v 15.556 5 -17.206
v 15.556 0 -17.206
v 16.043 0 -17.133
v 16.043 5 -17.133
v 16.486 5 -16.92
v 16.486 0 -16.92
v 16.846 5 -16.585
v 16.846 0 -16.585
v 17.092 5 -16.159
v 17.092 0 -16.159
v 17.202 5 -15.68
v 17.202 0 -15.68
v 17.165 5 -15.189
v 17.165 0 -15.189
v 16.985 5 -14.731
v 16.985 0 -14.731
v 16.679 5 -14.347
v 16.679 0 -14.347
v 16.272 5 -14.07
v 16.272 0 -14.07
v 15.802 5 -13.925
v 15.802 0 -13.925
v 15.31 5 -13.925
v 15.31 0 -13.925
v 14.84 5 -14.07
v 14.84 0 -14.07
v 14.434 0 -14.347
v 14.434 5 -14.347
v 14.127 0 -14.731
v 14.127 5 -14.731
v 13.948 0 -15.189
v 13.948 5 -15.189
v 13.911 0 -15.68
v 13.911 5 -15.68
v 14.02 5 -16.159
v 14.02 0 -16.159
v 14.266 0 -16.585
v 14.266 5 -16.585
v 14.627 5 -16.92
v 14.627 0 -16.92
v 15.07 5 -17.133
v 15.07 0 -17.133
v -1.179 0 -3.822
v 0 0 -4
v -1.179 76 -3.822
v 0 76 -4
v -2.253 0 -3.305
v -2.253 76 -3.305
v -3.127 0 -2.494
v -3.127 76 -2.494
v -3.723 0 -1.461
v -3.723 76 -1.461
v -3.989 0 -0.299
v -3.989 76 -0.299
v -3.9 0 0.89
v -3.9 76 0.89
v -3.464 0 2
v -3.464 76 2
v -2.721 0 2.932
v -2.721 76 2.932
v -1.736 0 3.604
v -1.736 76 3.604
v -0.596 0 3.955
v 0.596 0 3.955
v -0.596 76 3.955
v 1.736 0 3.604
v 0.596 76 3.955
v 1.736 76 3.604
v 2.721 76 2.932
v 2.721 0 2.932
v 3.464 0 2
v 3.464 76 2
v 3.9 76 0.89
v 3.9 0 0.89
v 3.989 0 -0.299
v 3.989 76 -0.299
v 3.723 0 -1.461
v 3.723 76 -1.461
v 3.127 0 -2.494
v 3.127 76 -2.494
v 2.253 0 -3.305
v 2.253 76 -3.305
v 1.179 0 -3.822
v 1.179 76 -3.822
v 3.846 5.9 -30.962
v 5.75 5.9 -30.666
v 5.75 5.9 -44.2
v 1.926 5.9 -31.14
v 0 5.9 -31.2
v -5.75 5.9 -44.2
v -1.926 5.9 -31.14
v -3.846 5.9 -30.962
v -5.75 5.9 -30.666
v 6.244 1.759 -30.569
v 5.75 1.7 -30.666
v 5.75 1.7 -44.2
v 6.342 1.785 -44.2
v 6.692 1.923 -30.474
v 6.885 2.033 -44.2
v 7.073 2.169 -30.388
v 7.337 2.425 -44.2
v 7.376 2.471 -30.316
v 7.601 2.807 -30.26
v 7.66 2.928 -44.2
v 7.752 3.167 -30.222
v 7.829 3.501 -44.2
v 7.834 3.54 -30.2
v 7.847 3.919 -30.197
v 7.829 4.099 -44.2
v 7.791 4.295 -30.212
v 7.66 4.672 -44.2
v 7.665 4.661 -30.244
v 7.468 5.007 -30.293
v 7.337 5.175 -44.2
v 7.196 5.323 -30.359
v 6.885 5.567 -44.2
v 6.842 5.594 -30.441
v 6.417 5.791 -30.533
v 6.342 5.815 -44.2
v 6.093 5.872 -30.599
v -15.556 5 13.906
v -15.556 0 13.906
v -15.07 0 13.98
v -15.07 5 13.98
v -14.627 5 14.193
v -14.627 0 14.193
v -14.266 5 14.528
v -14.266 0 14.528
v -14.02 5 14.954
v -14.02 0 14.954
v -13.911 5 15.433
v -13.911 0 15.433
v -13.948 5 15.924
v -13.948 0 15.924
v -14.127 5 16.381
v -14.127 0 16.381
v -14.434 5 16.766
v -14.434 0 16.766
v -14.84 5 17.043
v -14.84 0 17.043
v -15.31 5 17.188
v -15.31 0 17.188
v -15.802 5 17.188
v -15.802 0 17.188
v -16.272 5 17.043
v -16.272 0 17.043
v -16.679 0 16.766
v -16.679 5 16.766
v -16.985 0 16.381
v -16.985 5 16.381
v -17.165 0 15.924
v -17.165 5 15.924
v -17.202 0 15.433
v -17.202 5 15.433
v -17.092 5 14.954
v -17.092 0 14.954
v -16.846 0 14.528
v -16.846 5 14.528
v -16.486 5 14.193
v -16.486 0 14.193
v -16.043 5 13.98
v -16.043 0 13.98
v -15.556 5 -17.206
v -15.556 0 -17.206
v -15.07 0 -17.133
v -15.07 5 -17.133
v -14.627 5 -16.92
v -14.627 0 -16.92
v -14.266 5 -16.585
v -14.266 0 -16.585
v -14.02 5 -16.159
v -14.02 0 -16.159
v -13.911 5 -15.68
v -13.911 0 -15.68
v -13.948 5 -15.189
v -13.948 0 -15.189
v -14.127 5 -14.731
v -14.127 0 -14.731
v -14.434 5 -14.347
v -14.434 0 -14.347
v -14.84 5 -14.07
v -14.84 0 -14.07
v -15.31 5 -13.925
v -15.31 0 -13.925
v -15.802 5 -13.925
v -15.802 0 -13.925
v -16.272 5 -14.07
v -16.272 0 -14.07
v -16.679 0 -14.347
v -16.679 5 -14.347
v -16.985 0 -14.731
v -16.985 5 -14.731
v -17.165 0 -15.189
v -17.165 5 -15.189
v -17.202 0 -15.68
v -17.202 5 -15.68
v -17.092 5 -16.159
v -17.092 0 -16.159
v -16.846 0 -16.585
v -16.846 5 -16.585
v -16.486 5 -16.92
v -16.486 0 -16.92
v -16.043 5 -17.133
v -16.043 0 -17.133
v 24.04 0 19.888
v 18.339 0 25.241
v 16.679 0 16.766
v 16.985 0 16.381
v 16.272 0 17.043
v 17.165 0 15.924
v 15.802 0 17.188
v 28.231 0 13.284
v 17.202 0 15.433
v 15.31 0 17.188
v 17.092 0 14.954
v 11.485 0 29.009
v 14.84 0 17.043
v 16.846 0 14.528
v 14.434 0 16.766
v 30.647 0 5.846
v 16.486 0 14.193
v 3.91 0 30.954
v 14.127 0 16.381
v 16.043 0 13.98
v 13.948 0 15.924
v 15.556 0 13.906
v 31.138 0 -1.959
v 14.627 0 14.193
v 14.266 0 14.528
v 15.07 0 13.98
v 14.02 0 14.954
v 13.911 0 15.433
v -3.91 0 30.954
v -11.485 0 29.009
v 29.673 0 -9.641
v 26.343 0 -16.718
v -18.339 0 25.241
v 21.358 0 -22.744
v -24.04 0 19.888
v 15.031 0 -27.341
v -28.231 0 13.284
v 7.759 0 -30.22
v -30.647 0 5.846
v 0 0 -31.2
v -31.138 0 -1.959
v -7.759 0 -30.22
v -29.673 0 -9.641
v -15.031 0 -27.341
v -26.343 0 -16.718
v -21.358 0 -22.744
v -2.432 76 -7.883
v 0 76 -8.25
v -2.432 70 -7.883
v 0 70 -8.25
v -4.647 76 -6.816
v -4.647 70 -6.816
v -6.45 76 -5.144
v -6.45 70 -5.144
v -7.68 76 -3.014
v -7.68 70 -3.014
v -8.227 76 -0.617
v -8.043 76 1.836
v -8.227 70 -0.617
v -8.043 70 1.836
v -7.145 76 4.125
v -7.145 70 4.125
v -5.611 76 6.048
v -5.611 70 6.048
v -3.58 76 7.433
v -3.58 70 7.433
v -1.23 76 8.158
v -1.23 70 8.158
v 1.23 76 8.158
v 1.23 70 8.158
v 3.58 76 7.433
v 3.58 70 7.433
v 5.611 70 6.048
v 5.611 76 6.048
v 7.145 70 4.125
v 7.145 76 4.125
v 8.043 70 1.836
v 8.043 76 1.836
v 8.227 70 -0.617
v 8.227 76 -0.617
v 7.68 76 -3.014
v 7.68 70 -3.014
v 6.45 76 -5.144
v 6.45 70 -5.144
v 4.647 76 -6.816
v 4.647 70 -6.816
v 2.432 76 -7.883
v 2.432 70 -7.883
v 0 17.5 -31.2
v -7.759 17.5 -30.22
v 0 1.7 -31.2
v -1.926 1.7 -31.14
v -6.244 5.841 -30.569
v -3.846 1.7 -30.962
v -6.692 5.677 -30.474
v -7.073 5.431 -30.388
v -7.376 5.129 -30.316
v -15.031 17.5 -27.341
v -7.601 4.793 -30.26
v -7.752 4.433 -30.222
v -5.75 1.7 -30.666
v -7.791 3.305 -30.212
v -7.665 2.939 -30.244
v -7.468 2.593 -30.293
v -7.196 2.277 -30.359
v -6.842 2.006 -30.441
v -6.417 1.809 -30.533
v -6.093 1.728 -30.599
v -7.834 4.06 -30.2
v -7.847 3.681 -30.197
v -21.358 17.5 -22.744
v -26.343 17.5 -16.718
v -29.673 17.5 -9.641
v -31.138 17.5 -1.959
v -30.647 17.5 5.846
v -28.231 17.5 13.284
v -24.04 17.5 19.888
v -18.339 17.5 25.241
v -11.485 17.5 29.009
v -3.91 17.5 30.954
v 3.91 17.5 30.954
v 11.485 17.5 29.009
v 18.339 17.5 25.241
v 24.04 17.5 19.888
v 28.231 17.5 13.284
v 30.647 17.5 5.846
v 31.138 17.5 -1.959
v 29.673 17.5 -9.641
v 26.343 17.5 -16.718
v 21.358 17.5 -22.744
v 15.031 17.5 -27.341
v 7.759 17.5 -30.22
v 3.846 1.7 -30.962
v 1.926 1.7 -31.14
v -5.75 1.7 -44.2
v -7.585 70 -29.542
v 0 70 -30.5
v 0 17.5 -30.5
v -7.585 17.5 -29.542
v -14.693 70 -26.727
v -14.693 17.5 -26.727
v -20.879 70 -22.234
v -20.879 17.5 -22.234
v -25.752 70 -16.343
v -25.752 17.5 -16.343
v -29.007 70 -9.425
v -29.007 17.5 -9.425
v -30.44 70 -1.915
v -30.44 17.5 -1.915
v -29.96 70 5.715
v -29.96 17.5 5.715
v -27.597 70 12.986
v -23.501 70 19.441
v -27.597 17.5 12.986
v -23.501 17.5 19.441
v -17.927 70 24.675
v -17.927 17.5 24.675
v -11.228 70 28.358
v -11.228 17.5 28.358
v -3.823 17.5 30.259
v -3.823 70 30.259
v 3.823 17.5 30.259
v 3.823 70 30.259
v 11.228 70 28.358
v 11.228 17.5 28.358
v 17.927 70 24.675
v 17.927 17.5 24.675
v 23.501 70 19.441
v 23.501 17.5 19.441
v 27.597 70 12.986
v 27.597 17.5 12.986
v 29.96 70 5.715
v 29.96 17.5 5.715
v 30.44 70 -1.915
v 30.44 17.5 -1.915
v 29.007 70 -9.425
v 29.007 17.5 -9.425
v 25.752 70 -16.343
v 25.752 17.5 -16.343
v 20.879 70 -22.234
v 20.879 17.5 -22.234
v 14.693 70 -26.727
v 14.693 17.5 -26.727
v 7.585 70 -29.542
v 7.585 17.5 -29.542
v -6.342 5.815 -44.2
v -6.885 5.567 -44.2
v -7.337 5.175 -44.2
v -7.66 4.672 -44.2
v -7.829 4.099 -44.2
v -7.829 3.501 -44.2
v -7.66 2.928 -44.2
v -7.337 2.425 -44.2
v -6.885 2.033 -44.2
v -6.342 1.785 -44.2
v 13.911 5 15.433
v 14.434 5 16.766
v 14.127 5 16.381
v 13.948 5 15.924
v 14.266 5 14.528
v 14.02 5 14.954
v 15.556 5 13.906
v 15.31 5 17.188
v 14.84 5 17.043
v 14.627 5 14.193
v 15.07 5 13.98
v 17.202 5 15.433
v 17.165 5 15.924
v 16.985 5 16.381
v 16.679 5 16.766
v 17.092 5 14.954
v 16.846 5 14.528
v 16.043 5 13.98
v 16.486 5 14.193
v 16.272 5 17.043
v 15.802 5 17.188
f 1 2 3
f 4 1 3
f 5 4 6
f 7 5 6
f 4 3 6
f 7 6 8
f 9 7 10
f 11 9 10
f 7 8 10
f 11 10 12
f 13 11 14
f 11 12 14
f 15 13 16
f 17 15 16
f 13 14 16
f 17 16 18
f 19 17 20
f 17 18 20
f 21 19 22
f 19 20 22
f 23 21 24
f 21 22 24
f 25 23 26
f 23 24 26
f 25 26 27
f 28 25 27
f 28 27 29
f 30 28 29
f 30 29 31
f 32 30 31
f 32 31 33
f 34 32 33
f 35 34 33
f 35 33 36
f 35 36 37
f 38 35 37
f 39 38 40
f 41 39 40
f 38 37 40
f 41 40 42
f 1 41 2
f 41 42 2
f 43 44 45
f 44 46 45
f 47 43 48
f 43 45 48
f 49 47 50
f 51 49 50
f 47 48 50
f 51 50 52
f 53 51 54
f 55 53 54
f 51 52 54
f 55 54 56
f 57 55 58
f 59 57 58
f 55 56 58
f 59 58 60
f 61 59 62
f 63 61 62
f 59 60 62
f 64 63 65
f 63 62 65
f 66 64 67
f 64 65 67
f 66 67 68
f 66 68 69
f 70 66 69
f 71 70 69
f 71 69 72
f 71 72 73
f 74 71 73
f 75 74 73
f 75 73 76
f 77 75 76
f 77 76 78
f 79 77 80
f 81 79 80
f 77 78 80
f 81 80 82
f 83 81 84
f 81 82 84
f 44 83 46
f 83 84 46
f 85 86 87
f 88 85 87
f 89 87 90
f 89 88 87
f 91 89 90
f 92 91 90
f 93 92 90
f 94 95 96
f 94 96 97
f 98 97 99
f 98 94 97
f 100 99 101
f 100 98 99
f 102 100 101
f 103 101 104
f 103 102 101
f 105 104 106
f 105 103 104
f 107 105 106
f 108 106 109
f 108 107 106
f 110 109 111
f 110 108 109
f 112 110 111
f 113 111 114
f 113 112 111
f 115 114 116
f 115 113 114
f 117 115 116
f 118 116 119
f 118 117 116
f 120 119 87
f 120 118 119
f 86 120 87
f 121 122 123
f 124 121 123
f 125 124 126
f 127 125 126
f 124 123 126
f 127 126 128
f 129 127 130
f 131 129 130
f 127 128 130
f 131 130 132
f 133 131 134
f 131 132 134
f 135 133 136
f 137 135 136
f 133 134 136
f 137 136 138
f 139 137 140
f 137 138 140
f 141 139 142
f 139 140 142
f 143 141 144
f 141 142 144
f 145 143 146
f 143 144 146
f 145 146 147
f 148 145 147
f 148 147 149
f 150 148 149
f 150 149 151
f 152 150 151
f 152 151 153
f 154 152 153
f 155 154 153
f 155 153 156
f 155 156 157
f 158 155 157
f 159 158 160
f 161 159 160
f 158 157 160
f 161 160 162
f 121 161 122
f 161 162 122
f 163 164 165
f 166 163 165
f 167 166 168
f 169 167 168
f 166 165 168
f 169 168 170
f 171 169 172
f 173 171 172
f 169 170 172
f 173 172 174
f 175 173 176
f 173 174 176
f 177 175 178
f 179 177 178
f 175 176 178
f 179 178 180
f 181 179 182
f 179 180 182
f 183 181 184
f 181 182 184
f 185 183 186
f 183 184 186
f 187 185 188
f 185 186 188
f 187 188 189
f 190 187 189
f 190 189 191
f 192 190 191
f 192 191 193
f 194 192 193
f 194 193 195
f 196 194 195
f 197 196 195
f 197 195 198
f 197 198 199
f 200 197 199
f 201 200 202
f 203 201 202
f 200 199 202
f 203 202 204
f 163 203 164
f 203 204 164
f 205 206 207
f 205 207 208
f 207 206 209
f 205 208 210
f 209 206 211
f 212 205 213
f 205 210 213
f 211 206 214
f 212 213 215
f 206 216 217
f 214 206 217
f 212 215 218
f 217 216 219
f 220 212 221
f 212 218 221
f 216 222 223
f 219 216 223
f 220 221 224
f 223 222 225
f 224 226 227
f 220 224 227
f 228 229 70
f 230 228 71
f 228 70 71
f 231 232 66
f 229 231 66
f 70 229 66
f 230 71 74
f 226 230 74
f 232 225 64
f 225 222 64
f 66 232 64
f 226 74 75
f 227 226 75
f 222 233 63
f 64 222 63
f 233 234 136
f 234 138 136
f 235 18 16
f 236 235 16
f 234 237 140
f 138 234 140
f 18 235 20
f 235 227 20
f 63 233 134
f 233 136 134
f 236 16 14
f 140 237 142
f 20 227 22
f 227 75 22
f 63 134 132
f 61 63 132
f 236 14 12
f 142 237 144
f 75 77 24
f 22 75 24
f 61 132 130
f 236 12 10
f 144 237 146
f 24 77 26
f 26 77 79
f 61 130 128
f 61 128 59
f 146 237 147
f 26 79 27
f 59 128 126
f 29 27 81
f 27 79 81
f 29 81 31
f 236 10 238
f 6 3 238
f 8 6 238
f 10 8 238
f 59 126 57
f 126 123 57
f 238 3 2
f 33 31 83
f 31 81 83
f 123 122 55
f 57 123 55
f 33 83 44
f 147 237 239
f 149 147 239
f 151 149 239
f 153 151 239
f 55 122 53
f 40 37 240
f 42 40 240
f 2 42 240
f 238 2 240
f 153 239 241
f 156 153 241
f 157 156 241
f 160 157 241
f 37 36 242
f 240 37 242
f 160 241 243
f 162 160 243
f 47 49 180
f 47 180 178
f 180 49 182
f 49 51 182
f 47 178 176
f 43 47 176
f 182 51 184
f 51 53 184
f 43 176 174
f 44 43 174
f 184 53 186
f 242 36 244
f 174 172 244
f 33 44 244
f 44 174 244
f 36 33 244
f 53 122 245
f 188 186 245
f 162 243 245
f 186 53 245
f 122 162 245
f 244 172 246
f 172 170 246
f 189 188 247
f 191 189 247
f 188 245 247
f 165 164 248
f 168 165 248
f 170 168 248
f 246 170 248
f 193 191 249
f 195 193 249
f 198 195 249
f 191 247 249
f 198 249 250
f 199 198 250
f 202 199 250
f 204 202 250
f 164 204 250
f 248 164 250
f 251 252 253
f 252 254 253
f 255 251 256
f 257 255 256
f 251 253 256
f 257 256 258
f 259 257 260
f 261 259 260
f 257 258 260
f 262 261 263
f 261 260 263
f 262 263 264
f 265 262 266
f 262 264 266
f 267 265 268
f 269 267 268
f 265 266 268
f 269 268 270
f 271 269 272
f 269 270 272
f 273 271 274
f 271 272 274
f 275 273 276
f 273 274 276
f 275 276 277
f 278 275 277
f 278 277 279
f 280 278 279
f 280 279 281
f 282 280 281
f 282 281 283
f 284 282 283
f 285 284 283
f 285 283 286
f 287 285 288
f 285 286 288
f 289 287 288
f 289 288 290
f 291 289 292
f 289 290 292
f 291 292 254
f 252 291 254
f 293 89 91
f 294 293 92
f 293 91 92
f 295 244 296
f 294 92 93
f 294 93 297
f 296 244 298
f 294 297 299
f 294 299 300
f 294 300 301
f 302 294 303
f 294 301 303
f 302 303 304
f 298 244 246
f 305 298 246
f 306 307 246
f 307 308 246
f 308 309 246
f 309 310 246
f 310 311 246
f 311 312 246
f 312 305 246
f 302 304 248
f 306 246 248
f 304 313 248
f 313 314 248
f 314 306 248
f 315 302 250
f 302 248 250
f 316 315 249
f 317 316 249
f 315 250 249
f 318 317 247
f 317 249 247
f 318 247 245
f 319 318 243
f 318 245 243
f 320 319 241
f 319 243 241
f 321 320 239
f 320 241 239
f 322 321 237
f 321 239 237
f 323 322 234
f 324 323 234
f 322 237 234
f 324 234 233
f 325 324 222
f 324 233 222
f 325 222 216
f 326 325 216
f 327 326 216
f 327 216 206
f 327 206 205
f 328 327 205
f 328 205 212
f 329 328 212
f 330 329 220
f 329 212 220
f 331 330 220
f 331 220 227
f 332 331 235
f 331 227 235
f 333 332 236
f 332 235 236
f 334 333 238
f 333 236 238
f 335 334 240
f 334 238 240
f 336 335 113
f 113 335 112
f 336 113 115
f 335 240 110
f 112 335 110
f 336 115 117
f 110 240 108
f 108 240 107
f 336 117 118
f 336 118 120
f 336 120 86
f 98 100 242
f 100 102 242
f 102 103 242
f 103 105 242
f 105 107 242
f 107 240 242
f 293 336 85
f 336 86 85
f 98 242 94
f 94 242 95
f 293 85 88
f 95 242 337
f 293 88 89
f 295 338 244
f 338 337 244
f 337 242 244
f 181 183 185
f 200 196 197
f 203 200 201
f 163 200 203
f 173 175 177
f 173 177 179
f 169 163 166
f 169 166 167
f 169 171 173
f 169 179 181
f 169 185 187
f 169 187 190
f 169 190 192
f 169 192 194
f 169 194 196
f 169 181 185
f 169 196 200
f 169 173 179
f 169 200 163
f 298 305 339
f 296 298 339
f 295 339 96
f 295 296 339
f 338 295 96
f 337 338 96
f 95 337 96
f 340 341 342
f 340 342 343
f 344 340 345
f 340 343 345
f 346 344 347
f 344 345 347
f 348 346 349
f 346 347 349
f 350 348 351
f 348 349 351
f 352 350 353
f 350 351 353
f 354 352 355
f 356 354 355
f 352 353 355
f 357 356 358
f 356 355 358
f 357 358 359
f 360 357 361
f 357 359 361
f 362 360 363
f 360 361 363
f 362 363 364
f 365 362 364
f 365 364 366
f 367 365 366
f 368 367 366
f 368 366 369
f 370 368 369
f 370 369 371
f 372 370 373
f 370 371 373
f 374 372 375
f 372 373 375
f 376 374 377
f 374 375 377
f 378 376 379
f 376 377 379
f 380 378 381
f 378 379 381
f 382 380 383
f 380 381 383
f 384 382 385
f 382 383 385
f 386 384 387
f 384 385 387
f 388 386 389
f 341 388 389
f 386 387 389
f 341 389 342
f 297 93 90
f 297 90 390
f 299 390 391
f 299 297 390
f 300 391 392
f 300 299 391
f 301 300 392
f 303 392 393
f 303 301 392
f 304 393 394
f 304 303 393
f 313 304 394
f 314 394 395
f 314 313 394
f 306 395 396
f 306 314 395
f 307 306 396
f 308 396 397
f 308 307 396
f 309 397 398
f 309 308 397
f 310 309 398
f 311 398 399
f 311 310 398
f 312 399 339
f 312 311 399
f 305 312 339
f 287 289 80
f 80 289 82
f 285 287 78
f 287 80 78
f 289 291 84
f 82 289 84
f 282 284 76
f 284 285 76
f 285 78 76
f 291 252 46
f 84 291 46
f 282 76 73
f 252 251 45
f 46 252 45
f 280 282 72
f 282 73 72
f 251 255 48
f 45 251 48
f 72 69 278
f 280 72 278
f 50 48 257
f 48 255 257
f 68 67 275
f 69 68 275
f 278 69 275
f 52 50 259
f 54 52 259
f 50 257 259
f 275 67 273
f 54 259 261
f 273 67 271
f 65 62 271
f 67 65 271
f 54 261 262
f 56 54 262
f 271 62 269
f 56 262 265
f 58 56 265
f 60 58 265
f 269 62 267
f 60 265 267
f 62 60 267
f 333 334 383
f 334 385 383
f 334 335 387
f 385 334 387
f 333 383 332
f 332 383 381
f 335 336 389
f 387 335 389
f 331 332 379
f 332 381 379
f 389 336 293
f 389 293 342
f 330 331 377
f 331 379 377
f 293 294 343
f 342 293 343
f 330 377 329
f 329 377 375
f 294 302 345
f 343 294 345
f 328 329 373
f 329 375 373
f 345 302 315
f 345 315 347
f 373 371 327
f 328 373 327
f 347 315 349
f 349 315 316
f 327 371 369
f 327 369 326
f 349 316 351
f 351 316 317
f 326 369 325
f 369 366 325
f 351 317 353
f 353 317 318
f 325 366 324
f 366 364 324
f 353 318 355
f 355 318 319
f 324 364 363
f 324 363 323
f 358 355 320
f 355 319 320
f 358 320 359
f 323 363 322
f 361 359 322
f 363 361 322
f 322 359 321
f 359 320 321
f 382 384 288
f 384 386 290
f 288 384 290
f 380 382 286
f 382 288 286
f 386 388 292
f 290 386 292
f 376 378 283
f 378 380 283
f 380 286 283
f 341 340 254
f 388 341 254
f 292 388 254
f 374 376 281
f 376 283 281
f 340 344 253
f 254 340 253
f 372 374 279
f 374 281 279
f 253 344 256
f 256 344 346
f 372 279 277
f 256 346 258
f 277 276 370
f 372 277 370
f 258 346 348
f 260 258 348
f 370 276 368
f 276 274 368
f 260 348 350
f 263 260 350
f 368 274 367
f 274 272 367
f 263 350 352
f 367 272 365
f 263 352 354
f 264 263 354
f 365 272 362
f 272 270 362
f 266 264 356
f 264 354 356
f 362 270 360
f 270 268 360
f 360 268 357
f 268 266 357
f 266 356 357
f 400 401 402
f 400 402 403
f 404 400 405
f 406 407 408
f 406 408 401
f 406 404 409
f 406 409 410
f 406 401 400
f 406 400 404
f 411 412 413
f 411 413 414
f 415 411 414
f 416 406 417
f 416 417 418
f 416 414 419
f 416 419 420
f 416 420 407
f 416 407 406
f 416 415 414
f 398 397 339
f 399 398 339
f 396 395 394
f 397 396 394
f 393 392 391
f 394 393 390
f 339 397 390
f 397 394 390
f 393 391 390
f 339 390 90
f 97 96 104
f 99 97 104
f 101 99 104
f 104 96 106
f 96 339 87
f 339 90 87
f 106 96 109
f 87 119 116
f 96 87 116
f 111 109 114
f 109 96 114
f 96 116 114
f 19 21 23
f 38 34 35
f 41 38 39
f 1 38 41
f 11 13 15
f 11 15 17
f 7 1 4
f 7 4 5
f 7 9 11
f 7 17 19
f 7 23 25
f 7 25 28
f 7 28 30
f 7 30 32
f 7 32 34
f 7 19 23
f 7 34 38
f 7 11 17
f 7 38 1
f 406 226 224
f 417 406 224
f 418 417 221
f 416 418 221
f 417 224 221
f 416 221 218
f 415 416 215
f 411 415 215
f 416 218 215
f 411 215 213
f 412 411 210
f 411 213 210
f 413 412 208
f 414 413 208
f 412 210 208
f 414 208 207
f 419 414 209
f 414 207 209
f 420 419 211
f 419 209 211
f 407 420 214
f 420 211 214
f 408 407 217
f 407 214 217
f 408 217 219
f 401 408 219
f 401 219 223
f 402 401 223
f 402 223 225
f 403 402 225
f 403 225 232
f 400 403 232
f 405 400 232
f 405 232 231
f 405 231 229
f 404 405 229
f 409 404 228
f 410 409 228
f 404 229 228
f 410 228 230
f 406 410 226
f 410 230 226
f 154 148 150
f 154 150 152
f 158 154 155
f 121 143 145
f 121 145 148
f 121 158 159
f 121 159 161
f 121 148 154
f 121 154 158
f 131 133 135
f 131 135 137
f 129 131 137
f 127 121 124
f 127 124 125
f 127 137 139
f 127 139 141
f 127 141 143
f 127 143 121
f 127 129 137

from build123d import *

# Parameters (mm, degrees)
SKETCH3_R           = 1.65
CUT_EXTRUDE1_DEPTH  = 5
BOSS_EXTRUDE1_START = -2
BOSS_EXTRUDE1_DEPTH = 15


with BuildPart() as part:
    # Sketch2 → Revolve1 (revolve)
    with BuildSketch(Plane.XY, mode=Mode.PRIVATE) as revolve1_sk:
        Polygon((4, 0), (4, 76), (8.25, 76), (8.25, 70), (30.5, 70), (30.5, 17.5), (31.2, 17.5), (31.2, 0), align=None)
    revolve(revolve1_sk.sketch.rotate(Axis((0, 0, 0), (0, 1, 0)), 90), axis=Axis((0, 0, 0), (0, 1, 0)))

    # Sketch3 → Cut-Extrude1 (cut)
    with BuildSketch(Plane.XZ):
        with Locations(Location((15.556349186, -15.556349186, 0), (0, 0, 270))):
            Circle(SKETCH3_R)
        with Locations(Location((-15.556349186, -15.556349186, 0), (0, 0, 270))):
            Circle(SKETCH3_R)
        with Locations(Location((-15.556349186, 15.556349186, 0), (0, 0, 270))):
            Circle(SKETCH3_R)
        with Locations(Location((15.556349186, 15.556349186, 0), (0, 0, 270))):
            Circle(SKETCH3_R)
    extrude(amount=-CUT_EXTRUDE1_DEPTH, mode=Mode.SUBTRACT)

    # Sketch4 → Boss-Extrude1 (add)
    with BuildSketch(Plane(origin=(0, 0, -31.2), x_dir=(-1, 0, 0), z_dir=(0, 0, -1)).offset(BOSS_EXTRUDE1_START)):
        with BuildLine():
            Line((-5.75, 5.9), (5.75, 5.9))
            ThreePointArc((5.75, 5.9), (7.85, 3.8), (5.75, 1.7))
            Line((5.75, 1.7), (-5.75, 1.7))
            ThreePointArc((-5.75, 1.7), (-7.85, 3.8), (-5.75, 5.9))
        make_face()
    extrude(amount=BOSS_EXTRUDE1_DEPTH)


solid = part.part
